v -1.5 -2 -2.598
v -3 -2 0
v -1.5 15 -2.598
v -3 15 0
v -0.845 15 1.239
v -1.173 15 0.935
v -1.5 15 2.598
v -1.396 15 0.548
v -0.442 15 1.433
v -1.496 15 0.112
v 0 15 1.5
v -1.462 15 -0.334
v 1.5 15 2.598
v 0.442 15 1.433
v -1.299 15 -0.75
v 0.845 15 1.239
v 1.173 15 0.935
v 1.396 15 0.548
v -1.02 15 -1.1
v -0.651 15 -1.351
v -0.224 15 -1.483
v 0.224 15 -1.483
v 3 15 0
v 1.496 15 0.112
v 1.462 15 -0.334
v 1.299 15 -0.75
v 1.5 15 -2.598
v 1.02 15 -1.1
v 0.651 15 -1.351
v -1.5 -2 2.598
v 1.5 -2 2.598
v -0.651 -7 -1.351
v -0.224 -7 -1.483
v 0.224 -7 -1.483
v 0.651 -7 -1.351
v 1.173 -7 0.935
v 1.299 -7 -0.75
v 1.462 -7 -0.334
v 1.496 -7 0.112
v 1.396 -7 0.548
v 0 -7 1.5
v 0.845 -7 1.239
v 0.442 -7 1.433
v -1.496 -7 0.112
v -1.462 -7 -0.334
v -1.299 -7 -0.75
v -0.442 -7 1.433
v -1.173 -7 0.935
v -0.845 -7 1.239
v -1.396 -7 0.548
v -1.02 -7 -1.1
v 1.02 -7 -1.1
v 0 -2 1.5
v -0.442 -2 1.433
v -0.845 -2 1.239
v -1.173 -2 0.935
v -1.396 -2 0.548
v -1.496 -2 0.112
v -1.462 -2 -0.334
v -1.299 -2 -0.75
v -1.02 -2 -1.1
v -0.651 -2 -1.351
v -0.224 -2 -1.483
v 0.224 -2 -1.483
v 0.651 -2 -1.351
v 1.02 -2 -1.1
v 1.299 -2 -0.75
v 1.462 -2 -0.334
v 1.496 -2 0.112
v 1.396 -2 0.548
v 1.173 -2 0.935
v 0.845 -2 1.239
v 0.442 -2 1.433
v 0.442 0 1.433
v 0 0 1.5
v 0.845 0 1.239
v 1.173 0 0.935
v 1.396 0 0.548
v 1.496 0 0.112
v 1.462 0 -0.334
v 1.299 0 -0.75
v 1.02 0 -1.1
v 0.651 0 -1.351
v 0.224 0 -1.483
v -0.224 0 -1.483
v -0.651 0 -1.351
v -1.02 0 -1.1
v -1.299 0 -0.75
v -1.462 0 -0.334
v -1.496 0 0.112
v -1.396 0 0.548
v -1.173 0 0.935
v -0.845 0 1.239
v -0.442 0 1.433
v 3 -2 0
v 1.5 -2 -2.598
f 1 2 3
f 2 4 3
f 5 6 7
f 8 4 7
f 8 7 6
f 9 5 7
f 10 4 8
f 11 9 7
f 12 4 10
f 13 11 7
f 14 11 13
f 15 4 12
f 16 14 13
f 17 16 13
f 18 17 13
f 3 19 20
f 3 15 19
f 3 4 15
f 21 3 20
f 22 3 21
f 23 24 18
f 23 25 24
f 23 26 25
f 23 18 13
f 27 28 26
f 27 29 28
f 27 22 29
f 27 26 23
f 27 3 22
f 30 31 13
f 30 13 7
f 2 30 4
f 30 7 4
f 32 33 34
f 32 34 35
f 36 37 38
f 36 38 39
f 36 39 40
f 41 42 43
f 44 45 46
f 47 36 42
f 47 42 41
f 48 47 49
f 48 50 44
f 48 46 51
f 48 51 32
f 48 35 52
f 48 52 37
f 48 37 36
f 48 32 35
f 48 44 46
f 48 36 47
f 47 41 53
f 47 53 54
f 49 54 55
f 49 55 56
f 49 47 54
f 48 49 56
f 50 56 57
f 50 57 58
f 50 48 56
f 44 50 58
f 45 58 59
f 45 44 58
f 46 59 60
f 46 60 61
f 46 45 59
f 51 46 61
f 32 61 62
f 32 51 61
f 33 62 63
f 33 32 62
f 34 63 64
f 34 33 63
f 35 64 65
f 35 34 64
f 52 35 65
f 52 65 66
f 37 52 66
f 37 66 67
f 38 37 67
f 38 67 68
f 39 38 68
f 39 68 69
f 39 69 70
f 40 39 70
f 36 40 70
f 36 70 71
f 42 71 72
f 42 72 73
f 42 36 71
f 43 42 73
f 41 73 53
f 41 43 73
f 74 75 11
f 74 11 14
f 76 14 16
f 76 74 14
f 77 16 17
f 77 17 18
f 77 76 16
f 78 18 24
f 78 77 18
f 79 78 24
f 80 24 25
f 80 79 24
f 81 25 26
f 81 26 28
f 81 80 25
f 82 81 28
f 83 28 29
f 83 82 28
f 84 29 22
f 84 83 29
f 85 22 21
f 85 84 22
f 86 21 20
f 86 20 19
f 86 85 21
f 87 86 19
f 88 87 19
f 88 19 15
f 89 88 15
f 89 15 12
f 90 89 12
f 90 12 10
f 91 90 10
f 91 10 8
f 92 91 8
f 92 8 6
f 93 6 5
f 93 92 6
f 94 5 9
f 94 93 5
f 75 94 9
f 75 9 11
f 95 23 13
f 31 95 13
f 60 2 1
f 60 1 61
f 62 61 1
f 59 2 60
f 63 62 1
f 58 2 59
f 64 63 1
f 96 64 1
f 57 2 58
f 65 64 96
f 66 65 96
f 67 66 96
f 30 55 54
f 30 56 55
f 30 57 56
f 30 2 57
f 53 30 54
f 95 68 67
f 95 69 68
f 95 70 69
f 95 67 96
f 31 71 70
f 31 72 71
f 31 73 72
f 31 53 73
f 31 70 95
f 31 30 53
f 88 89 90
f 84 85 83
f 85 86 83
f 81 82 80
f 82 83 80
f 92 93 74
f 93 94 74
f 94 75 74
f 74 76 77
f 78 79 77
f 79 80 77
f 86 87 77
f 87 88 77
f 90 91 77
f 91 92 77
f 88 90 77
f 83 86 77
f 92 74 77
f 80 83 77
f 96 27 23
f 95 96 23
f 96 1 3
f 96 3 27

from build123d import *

# Parameters (mm, degrees)
SKETCH1_R           = 1.5
BOSS_EXTRUDE1_DEPTH = 15
BOSS_EXTRUDE2_DEPTH = 2
BOSS_EXTRUDE3_START = 5
SKETCH3_R           = 1.5
BOSS_EXTRUDE3_DEPTH = 5


with BuildPart() as part:
    # Sketch1 → Boss-Extrude1 (new body)
    with BuildSketch(Plane(origin=(0, 0, 0), x_dir=(1, 0, 0), z_dir=(0, 1, 0))):
        Polygon((3, 0), (1.5, 2.598076211), (-1.5, 2.598076211), (-3, 0), (-1.5, -2.598076211), (1.5, -2.598076211), align=None)
        with Locations(Location((0, 0, 0), (0, 0, 270))):
            Circle(SKETCH1_R, mode=Mode.SUBTRACT)
    extrude(amount=BOSS_EXTRUDE1_DEPTH)

    # Sketch2 → Boss-Extrude2 (add)
    with BuildSketch(Plane.XZ):
        Polygon((1.5, 2.598076211), (-1.5, 2.598076211), (-3, 0), (-1.5, -2.598076211), (1.5, -2.598076211), (3, 0), align=None)
    extrude(amount=BOSS_EXTRUDE2_DEPTH)

    # Sketch3 → Boss-Extrude3 (add)
    with BuildSketch(Plane.XZ.offset(2).offset(BOSS_EXTRUDE3_START)):
        with Locations(Location((0, 0, 0), (0, 0, 90))):
            Circle(SKETCH3_R)
    extrude(amount=-BOSS_EXTRUDE3_DEPTH)


solid = part.part
